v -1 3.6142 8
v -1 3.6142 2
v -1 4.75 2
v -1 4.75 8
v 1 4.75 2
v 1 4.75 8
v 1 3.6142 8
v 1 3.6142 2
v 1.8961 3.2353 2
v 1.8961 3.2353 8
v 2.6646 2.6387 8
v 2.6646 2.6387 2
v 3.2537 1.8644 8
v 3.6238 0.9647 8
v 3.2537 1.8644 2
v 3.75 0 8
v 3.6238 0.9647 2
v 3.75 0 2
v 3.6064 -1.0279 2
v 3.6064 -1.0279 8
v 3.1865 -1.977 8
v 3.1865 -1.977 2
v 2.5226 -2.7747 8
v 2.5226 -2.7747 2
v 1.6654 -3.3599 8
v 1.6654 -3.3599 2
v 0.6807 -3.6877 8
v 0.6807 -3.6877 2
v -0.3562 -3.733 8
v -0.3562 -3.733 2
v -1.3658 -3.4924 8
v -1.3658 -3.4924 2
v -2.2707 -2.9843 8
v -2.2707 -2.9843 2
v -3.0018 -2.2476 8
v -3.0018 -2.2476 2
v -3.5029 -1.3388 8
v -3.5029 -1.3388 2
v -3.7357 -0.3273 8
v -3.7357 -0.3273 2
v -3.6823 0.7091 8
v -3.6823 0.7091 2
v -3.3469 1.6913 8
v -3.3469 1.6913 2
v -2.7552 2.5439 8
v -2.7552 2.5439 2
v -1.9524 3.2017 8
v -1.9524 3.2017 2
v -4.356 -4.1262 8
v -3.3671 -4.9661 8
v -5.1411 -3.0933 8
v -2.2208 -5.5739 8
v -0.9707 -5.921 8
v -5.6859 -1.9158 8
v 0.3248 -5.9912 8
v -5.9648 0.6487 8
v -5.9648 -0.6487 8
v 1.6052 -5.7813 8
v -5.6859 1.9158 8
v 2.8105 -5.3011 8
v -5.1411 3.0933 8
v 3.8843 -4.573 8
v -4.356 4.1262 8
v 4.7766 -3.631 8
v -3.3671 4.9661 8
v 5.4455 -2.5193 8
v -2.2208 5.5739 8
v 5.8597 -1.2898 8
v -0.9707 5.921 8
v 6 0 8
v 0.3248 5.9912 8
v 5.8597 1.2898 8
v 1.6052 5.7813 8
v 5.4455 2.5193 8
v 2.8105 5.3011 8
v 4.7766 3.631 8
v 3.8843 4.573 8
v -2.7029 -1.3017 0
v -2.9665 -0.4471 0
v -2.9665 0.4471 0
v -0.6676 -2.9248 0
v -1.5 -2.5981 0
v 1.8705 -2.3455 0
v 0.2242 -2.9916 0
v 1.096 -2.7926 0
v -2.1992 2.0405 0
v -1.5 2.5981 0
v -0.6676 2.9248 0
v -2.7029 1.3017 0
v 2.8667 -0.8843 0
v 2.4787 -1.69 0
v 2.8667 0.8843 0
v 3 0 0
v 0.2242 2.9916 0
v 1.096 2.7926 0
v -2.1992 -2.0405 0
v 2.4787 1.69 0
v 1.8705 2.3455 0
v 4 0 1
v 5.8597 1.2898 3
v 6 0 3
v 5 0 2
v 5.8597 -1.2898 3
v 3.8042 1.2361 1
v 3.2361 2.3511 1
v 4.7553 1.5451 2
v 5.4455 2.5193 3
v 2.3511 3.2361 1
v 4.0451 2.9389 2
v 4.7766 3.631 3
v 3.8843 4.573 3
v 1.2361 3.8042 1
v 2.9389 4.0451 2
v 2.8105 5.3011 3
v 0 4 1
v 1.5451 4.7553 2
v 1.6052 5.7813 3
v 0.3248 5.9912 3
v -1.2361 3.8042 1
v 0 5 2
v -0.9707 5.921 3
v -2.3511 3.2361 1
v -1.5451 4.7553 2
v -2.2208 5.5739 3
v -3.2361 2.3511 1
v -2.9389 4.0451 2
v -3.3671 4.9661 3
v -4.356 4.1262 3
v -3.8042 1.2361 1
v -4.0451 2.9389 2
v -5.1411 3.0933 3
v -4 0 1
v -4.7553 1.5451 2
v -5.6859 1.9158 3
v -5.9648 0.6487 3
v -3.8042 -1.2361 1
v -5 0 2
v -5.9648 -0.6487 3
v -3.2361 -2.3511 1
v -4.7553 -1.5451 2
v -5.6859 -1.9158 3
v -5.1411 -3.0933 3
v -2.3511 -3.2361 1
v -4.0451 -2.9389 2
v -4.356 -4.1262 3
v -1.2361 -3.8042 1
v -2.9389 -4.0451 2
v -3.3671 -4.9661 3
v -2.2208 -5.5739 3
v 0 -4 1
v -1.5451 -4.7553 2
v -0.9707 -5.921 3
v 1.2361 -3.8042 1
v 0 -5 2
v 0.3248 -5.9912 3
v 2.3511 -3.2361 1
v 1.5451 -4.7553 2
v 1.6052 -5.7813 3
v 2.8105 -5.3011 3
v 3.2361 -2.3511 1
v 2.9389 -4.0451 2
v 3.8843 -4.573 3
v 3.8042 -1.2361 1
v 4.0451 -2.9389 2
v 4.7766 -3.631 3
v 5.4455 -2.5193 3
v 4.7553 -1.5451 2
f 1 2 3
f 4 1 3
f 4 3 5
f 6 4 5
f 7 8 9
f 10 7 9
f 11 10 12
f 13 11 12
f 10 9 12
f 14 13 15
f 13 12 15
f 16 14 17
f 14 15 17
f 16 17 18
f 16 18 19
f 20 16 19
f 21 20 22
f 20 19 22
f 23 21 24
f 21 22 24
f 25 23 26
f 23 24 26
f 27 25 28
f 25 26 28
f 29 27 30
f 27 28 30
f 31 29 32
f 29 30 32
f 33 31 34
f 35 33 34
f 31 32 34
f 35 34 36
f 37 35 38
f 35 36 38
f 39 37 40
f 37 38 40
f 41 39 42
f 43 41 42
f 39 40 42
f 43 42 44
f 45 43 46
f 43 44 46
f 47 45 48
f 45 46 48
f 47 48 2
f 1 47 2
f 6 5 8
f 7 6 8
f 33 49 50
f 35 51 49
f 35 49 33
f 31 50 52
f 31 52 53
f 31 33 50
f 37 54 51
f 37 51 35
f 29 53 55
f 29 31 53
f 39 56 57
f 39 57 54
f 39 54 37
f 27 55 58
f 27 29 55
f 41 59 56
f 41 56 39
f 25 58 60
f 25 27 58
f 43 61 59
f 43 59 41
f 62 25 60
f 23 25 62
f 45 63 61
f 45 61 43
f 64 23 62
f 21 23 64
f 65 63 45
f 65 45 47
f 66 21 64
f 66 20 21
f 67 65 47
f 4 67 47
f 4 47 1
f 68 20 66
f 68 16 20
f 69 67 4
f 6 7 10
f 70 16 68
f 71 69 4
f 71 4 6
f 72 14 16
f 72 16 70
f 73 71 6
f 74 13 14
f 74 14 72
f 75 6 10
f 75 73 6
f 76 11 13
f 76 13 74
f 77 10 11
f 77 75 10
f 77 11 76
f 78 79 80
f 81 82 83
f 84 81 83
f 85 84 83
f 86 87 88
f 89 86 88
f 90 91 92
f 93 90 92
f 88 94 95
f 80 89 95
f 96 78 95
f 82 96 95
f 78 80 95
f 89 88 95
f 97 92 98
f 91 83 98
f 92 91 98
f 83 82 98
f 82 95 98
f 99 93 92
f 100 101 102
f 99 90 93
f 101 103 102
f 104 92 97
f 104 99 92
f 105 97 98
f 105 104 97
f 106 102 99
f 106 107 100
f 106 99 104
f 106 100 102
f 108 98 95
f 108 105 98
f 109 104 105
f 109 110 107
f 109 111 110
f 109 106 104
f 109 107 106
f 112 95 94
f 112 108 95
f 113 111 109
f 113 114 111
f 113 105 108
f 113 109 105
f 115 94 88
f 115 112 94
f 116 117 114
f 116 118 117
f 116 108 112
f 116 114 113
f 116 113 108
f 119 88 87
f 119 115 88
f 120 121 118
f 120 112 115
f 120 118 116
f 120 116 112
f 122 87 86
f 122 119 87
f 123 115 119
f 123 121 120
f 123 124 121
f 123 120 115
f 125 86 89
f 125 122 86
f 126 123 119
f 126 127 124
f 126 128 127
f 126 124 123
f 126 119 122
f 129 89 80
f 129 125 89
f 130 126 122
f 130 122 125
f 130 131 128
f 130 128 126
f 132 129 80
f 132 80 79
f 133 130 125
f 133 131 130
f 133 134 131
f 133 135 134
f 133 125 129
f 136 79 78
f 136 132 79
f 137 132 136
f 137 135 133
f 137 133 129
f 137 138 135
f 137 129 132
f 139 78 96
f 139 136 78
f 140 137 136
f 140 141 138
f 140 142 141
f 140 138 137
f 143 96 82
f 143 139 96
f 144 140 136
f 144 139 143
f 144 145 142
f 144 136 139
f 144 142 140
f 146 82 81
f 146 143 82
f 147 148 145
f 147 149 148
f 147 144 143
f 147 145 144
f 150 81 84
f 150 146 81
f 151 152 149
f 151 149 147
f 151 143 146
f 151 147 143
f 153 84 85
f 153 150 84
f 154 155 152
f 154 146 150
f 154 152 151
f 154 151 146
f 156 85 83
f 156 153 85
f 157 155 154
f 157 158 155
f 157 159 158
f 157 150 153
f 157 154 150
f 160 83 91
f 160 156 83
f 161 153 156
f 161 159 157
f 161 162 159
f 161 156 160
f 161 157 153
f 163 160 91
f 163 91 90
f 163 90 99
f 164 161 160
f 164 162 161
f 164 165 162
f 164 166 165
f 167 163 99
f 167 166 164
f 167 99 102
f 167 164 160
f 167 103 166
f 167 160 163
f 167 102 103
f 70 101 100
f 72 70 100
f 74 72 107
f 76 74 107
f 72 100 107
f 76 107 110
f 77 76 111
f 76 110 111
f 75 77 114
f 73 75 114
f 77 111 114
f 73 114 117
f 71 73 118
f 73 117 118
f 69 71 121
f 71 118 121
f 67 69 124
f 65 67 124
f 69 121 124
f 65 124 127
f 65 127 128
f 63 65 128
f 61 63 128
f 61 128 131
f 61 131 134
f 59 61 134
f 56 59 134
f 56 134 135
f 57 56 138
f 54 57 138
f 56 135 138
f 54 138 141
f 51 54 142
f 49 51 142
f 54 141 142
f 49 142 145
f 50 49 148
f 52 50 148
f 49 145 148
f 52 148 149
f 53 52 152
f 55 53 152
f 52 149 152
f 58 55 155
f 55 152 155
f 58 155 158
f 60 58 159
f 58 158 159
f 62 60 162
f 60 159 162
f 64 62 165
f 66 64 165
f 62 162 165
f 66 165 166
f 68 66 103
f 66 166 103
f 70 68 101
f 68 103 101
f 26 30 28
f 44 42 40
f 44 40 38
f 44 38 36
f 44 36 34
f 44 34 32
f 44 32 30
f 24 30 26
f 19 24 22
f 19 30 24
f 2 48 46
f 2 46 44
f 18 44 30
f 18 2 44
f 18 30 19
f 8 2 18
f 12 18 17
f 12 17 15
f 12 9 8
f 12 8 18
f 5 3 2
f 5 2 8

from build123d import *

# Parameters (mm, degrees)
F0_R     = 6
F1_DEPTH = 8
F2_DEPTH = 2
F3_SIZE  = 3


with BuildPart() as f1:
    # F0 (on Top) → F1 (new body)
    with BuildSketch(Plane.XY):
        Circle(F0_R)
        with BuildLine():
            ThreePointArc((1, 3.614208), (2.984334, 2.270738), (3.75, 0))
            ThreePointArc((3.75, 0), (-2.270738, -2.984334), (-1, 3.614208))
            Line((-1, 3.614208), (-1, 4.75))
            Line((-1, 4.75), (1, 4.75))
            Line((1, 4.75), (1, 3.614208))
        make_face(mode=Mode.SUBTRACT)
    extrude(amount=F1_DEPTH)

    # F0 (on Top) → F2 (join)
    with BuildSketch(Plane.XY):
        with BuildLine():
            ThreePointArc((-1, 3.614208), (-2.270738, -2.984334), (3.75, 0))
            ThreePointArc((3.75, 0), (2.984334, 2.270738), (1, 3.614208))
            Line((1, 3.614208), (1, 2.75))
            Line((1, 2.75), (-1, 2.75))
            Line((-1, 2.75), (-1, 3.614208))
        make_face()
        with BuildLine():
            Line((1, 2.75), (1, 3.614208))
            ThreePointArc((1, 3.614208), (0, 3.75), (-1, 3.614208))
            Line((-1, 3.614208), (-1, 2.75))
            Line((-1, 2.75), (1, 2.75))
        make_face()
        with BuildLine():
            ThreePointArc((-1, 3.614208), (0, 3.75), (1, 3.614208))
            Line((1, 3.614208), (1, 4.75))
            Line((1, 4.75), (-1, 4.75))
            Line((-1, 4.75), (-1, 3.614208))
        make_face()
    extrude(amount=F2_DEPTH)

    # F3
    f3_edges = [f1.edges().sort_by_distance(p)[0] for p in [
        (-6, 0, 0),
    ]]
    chamfer(f3_edges, length=F3_SIZE)


solid = f1.part
